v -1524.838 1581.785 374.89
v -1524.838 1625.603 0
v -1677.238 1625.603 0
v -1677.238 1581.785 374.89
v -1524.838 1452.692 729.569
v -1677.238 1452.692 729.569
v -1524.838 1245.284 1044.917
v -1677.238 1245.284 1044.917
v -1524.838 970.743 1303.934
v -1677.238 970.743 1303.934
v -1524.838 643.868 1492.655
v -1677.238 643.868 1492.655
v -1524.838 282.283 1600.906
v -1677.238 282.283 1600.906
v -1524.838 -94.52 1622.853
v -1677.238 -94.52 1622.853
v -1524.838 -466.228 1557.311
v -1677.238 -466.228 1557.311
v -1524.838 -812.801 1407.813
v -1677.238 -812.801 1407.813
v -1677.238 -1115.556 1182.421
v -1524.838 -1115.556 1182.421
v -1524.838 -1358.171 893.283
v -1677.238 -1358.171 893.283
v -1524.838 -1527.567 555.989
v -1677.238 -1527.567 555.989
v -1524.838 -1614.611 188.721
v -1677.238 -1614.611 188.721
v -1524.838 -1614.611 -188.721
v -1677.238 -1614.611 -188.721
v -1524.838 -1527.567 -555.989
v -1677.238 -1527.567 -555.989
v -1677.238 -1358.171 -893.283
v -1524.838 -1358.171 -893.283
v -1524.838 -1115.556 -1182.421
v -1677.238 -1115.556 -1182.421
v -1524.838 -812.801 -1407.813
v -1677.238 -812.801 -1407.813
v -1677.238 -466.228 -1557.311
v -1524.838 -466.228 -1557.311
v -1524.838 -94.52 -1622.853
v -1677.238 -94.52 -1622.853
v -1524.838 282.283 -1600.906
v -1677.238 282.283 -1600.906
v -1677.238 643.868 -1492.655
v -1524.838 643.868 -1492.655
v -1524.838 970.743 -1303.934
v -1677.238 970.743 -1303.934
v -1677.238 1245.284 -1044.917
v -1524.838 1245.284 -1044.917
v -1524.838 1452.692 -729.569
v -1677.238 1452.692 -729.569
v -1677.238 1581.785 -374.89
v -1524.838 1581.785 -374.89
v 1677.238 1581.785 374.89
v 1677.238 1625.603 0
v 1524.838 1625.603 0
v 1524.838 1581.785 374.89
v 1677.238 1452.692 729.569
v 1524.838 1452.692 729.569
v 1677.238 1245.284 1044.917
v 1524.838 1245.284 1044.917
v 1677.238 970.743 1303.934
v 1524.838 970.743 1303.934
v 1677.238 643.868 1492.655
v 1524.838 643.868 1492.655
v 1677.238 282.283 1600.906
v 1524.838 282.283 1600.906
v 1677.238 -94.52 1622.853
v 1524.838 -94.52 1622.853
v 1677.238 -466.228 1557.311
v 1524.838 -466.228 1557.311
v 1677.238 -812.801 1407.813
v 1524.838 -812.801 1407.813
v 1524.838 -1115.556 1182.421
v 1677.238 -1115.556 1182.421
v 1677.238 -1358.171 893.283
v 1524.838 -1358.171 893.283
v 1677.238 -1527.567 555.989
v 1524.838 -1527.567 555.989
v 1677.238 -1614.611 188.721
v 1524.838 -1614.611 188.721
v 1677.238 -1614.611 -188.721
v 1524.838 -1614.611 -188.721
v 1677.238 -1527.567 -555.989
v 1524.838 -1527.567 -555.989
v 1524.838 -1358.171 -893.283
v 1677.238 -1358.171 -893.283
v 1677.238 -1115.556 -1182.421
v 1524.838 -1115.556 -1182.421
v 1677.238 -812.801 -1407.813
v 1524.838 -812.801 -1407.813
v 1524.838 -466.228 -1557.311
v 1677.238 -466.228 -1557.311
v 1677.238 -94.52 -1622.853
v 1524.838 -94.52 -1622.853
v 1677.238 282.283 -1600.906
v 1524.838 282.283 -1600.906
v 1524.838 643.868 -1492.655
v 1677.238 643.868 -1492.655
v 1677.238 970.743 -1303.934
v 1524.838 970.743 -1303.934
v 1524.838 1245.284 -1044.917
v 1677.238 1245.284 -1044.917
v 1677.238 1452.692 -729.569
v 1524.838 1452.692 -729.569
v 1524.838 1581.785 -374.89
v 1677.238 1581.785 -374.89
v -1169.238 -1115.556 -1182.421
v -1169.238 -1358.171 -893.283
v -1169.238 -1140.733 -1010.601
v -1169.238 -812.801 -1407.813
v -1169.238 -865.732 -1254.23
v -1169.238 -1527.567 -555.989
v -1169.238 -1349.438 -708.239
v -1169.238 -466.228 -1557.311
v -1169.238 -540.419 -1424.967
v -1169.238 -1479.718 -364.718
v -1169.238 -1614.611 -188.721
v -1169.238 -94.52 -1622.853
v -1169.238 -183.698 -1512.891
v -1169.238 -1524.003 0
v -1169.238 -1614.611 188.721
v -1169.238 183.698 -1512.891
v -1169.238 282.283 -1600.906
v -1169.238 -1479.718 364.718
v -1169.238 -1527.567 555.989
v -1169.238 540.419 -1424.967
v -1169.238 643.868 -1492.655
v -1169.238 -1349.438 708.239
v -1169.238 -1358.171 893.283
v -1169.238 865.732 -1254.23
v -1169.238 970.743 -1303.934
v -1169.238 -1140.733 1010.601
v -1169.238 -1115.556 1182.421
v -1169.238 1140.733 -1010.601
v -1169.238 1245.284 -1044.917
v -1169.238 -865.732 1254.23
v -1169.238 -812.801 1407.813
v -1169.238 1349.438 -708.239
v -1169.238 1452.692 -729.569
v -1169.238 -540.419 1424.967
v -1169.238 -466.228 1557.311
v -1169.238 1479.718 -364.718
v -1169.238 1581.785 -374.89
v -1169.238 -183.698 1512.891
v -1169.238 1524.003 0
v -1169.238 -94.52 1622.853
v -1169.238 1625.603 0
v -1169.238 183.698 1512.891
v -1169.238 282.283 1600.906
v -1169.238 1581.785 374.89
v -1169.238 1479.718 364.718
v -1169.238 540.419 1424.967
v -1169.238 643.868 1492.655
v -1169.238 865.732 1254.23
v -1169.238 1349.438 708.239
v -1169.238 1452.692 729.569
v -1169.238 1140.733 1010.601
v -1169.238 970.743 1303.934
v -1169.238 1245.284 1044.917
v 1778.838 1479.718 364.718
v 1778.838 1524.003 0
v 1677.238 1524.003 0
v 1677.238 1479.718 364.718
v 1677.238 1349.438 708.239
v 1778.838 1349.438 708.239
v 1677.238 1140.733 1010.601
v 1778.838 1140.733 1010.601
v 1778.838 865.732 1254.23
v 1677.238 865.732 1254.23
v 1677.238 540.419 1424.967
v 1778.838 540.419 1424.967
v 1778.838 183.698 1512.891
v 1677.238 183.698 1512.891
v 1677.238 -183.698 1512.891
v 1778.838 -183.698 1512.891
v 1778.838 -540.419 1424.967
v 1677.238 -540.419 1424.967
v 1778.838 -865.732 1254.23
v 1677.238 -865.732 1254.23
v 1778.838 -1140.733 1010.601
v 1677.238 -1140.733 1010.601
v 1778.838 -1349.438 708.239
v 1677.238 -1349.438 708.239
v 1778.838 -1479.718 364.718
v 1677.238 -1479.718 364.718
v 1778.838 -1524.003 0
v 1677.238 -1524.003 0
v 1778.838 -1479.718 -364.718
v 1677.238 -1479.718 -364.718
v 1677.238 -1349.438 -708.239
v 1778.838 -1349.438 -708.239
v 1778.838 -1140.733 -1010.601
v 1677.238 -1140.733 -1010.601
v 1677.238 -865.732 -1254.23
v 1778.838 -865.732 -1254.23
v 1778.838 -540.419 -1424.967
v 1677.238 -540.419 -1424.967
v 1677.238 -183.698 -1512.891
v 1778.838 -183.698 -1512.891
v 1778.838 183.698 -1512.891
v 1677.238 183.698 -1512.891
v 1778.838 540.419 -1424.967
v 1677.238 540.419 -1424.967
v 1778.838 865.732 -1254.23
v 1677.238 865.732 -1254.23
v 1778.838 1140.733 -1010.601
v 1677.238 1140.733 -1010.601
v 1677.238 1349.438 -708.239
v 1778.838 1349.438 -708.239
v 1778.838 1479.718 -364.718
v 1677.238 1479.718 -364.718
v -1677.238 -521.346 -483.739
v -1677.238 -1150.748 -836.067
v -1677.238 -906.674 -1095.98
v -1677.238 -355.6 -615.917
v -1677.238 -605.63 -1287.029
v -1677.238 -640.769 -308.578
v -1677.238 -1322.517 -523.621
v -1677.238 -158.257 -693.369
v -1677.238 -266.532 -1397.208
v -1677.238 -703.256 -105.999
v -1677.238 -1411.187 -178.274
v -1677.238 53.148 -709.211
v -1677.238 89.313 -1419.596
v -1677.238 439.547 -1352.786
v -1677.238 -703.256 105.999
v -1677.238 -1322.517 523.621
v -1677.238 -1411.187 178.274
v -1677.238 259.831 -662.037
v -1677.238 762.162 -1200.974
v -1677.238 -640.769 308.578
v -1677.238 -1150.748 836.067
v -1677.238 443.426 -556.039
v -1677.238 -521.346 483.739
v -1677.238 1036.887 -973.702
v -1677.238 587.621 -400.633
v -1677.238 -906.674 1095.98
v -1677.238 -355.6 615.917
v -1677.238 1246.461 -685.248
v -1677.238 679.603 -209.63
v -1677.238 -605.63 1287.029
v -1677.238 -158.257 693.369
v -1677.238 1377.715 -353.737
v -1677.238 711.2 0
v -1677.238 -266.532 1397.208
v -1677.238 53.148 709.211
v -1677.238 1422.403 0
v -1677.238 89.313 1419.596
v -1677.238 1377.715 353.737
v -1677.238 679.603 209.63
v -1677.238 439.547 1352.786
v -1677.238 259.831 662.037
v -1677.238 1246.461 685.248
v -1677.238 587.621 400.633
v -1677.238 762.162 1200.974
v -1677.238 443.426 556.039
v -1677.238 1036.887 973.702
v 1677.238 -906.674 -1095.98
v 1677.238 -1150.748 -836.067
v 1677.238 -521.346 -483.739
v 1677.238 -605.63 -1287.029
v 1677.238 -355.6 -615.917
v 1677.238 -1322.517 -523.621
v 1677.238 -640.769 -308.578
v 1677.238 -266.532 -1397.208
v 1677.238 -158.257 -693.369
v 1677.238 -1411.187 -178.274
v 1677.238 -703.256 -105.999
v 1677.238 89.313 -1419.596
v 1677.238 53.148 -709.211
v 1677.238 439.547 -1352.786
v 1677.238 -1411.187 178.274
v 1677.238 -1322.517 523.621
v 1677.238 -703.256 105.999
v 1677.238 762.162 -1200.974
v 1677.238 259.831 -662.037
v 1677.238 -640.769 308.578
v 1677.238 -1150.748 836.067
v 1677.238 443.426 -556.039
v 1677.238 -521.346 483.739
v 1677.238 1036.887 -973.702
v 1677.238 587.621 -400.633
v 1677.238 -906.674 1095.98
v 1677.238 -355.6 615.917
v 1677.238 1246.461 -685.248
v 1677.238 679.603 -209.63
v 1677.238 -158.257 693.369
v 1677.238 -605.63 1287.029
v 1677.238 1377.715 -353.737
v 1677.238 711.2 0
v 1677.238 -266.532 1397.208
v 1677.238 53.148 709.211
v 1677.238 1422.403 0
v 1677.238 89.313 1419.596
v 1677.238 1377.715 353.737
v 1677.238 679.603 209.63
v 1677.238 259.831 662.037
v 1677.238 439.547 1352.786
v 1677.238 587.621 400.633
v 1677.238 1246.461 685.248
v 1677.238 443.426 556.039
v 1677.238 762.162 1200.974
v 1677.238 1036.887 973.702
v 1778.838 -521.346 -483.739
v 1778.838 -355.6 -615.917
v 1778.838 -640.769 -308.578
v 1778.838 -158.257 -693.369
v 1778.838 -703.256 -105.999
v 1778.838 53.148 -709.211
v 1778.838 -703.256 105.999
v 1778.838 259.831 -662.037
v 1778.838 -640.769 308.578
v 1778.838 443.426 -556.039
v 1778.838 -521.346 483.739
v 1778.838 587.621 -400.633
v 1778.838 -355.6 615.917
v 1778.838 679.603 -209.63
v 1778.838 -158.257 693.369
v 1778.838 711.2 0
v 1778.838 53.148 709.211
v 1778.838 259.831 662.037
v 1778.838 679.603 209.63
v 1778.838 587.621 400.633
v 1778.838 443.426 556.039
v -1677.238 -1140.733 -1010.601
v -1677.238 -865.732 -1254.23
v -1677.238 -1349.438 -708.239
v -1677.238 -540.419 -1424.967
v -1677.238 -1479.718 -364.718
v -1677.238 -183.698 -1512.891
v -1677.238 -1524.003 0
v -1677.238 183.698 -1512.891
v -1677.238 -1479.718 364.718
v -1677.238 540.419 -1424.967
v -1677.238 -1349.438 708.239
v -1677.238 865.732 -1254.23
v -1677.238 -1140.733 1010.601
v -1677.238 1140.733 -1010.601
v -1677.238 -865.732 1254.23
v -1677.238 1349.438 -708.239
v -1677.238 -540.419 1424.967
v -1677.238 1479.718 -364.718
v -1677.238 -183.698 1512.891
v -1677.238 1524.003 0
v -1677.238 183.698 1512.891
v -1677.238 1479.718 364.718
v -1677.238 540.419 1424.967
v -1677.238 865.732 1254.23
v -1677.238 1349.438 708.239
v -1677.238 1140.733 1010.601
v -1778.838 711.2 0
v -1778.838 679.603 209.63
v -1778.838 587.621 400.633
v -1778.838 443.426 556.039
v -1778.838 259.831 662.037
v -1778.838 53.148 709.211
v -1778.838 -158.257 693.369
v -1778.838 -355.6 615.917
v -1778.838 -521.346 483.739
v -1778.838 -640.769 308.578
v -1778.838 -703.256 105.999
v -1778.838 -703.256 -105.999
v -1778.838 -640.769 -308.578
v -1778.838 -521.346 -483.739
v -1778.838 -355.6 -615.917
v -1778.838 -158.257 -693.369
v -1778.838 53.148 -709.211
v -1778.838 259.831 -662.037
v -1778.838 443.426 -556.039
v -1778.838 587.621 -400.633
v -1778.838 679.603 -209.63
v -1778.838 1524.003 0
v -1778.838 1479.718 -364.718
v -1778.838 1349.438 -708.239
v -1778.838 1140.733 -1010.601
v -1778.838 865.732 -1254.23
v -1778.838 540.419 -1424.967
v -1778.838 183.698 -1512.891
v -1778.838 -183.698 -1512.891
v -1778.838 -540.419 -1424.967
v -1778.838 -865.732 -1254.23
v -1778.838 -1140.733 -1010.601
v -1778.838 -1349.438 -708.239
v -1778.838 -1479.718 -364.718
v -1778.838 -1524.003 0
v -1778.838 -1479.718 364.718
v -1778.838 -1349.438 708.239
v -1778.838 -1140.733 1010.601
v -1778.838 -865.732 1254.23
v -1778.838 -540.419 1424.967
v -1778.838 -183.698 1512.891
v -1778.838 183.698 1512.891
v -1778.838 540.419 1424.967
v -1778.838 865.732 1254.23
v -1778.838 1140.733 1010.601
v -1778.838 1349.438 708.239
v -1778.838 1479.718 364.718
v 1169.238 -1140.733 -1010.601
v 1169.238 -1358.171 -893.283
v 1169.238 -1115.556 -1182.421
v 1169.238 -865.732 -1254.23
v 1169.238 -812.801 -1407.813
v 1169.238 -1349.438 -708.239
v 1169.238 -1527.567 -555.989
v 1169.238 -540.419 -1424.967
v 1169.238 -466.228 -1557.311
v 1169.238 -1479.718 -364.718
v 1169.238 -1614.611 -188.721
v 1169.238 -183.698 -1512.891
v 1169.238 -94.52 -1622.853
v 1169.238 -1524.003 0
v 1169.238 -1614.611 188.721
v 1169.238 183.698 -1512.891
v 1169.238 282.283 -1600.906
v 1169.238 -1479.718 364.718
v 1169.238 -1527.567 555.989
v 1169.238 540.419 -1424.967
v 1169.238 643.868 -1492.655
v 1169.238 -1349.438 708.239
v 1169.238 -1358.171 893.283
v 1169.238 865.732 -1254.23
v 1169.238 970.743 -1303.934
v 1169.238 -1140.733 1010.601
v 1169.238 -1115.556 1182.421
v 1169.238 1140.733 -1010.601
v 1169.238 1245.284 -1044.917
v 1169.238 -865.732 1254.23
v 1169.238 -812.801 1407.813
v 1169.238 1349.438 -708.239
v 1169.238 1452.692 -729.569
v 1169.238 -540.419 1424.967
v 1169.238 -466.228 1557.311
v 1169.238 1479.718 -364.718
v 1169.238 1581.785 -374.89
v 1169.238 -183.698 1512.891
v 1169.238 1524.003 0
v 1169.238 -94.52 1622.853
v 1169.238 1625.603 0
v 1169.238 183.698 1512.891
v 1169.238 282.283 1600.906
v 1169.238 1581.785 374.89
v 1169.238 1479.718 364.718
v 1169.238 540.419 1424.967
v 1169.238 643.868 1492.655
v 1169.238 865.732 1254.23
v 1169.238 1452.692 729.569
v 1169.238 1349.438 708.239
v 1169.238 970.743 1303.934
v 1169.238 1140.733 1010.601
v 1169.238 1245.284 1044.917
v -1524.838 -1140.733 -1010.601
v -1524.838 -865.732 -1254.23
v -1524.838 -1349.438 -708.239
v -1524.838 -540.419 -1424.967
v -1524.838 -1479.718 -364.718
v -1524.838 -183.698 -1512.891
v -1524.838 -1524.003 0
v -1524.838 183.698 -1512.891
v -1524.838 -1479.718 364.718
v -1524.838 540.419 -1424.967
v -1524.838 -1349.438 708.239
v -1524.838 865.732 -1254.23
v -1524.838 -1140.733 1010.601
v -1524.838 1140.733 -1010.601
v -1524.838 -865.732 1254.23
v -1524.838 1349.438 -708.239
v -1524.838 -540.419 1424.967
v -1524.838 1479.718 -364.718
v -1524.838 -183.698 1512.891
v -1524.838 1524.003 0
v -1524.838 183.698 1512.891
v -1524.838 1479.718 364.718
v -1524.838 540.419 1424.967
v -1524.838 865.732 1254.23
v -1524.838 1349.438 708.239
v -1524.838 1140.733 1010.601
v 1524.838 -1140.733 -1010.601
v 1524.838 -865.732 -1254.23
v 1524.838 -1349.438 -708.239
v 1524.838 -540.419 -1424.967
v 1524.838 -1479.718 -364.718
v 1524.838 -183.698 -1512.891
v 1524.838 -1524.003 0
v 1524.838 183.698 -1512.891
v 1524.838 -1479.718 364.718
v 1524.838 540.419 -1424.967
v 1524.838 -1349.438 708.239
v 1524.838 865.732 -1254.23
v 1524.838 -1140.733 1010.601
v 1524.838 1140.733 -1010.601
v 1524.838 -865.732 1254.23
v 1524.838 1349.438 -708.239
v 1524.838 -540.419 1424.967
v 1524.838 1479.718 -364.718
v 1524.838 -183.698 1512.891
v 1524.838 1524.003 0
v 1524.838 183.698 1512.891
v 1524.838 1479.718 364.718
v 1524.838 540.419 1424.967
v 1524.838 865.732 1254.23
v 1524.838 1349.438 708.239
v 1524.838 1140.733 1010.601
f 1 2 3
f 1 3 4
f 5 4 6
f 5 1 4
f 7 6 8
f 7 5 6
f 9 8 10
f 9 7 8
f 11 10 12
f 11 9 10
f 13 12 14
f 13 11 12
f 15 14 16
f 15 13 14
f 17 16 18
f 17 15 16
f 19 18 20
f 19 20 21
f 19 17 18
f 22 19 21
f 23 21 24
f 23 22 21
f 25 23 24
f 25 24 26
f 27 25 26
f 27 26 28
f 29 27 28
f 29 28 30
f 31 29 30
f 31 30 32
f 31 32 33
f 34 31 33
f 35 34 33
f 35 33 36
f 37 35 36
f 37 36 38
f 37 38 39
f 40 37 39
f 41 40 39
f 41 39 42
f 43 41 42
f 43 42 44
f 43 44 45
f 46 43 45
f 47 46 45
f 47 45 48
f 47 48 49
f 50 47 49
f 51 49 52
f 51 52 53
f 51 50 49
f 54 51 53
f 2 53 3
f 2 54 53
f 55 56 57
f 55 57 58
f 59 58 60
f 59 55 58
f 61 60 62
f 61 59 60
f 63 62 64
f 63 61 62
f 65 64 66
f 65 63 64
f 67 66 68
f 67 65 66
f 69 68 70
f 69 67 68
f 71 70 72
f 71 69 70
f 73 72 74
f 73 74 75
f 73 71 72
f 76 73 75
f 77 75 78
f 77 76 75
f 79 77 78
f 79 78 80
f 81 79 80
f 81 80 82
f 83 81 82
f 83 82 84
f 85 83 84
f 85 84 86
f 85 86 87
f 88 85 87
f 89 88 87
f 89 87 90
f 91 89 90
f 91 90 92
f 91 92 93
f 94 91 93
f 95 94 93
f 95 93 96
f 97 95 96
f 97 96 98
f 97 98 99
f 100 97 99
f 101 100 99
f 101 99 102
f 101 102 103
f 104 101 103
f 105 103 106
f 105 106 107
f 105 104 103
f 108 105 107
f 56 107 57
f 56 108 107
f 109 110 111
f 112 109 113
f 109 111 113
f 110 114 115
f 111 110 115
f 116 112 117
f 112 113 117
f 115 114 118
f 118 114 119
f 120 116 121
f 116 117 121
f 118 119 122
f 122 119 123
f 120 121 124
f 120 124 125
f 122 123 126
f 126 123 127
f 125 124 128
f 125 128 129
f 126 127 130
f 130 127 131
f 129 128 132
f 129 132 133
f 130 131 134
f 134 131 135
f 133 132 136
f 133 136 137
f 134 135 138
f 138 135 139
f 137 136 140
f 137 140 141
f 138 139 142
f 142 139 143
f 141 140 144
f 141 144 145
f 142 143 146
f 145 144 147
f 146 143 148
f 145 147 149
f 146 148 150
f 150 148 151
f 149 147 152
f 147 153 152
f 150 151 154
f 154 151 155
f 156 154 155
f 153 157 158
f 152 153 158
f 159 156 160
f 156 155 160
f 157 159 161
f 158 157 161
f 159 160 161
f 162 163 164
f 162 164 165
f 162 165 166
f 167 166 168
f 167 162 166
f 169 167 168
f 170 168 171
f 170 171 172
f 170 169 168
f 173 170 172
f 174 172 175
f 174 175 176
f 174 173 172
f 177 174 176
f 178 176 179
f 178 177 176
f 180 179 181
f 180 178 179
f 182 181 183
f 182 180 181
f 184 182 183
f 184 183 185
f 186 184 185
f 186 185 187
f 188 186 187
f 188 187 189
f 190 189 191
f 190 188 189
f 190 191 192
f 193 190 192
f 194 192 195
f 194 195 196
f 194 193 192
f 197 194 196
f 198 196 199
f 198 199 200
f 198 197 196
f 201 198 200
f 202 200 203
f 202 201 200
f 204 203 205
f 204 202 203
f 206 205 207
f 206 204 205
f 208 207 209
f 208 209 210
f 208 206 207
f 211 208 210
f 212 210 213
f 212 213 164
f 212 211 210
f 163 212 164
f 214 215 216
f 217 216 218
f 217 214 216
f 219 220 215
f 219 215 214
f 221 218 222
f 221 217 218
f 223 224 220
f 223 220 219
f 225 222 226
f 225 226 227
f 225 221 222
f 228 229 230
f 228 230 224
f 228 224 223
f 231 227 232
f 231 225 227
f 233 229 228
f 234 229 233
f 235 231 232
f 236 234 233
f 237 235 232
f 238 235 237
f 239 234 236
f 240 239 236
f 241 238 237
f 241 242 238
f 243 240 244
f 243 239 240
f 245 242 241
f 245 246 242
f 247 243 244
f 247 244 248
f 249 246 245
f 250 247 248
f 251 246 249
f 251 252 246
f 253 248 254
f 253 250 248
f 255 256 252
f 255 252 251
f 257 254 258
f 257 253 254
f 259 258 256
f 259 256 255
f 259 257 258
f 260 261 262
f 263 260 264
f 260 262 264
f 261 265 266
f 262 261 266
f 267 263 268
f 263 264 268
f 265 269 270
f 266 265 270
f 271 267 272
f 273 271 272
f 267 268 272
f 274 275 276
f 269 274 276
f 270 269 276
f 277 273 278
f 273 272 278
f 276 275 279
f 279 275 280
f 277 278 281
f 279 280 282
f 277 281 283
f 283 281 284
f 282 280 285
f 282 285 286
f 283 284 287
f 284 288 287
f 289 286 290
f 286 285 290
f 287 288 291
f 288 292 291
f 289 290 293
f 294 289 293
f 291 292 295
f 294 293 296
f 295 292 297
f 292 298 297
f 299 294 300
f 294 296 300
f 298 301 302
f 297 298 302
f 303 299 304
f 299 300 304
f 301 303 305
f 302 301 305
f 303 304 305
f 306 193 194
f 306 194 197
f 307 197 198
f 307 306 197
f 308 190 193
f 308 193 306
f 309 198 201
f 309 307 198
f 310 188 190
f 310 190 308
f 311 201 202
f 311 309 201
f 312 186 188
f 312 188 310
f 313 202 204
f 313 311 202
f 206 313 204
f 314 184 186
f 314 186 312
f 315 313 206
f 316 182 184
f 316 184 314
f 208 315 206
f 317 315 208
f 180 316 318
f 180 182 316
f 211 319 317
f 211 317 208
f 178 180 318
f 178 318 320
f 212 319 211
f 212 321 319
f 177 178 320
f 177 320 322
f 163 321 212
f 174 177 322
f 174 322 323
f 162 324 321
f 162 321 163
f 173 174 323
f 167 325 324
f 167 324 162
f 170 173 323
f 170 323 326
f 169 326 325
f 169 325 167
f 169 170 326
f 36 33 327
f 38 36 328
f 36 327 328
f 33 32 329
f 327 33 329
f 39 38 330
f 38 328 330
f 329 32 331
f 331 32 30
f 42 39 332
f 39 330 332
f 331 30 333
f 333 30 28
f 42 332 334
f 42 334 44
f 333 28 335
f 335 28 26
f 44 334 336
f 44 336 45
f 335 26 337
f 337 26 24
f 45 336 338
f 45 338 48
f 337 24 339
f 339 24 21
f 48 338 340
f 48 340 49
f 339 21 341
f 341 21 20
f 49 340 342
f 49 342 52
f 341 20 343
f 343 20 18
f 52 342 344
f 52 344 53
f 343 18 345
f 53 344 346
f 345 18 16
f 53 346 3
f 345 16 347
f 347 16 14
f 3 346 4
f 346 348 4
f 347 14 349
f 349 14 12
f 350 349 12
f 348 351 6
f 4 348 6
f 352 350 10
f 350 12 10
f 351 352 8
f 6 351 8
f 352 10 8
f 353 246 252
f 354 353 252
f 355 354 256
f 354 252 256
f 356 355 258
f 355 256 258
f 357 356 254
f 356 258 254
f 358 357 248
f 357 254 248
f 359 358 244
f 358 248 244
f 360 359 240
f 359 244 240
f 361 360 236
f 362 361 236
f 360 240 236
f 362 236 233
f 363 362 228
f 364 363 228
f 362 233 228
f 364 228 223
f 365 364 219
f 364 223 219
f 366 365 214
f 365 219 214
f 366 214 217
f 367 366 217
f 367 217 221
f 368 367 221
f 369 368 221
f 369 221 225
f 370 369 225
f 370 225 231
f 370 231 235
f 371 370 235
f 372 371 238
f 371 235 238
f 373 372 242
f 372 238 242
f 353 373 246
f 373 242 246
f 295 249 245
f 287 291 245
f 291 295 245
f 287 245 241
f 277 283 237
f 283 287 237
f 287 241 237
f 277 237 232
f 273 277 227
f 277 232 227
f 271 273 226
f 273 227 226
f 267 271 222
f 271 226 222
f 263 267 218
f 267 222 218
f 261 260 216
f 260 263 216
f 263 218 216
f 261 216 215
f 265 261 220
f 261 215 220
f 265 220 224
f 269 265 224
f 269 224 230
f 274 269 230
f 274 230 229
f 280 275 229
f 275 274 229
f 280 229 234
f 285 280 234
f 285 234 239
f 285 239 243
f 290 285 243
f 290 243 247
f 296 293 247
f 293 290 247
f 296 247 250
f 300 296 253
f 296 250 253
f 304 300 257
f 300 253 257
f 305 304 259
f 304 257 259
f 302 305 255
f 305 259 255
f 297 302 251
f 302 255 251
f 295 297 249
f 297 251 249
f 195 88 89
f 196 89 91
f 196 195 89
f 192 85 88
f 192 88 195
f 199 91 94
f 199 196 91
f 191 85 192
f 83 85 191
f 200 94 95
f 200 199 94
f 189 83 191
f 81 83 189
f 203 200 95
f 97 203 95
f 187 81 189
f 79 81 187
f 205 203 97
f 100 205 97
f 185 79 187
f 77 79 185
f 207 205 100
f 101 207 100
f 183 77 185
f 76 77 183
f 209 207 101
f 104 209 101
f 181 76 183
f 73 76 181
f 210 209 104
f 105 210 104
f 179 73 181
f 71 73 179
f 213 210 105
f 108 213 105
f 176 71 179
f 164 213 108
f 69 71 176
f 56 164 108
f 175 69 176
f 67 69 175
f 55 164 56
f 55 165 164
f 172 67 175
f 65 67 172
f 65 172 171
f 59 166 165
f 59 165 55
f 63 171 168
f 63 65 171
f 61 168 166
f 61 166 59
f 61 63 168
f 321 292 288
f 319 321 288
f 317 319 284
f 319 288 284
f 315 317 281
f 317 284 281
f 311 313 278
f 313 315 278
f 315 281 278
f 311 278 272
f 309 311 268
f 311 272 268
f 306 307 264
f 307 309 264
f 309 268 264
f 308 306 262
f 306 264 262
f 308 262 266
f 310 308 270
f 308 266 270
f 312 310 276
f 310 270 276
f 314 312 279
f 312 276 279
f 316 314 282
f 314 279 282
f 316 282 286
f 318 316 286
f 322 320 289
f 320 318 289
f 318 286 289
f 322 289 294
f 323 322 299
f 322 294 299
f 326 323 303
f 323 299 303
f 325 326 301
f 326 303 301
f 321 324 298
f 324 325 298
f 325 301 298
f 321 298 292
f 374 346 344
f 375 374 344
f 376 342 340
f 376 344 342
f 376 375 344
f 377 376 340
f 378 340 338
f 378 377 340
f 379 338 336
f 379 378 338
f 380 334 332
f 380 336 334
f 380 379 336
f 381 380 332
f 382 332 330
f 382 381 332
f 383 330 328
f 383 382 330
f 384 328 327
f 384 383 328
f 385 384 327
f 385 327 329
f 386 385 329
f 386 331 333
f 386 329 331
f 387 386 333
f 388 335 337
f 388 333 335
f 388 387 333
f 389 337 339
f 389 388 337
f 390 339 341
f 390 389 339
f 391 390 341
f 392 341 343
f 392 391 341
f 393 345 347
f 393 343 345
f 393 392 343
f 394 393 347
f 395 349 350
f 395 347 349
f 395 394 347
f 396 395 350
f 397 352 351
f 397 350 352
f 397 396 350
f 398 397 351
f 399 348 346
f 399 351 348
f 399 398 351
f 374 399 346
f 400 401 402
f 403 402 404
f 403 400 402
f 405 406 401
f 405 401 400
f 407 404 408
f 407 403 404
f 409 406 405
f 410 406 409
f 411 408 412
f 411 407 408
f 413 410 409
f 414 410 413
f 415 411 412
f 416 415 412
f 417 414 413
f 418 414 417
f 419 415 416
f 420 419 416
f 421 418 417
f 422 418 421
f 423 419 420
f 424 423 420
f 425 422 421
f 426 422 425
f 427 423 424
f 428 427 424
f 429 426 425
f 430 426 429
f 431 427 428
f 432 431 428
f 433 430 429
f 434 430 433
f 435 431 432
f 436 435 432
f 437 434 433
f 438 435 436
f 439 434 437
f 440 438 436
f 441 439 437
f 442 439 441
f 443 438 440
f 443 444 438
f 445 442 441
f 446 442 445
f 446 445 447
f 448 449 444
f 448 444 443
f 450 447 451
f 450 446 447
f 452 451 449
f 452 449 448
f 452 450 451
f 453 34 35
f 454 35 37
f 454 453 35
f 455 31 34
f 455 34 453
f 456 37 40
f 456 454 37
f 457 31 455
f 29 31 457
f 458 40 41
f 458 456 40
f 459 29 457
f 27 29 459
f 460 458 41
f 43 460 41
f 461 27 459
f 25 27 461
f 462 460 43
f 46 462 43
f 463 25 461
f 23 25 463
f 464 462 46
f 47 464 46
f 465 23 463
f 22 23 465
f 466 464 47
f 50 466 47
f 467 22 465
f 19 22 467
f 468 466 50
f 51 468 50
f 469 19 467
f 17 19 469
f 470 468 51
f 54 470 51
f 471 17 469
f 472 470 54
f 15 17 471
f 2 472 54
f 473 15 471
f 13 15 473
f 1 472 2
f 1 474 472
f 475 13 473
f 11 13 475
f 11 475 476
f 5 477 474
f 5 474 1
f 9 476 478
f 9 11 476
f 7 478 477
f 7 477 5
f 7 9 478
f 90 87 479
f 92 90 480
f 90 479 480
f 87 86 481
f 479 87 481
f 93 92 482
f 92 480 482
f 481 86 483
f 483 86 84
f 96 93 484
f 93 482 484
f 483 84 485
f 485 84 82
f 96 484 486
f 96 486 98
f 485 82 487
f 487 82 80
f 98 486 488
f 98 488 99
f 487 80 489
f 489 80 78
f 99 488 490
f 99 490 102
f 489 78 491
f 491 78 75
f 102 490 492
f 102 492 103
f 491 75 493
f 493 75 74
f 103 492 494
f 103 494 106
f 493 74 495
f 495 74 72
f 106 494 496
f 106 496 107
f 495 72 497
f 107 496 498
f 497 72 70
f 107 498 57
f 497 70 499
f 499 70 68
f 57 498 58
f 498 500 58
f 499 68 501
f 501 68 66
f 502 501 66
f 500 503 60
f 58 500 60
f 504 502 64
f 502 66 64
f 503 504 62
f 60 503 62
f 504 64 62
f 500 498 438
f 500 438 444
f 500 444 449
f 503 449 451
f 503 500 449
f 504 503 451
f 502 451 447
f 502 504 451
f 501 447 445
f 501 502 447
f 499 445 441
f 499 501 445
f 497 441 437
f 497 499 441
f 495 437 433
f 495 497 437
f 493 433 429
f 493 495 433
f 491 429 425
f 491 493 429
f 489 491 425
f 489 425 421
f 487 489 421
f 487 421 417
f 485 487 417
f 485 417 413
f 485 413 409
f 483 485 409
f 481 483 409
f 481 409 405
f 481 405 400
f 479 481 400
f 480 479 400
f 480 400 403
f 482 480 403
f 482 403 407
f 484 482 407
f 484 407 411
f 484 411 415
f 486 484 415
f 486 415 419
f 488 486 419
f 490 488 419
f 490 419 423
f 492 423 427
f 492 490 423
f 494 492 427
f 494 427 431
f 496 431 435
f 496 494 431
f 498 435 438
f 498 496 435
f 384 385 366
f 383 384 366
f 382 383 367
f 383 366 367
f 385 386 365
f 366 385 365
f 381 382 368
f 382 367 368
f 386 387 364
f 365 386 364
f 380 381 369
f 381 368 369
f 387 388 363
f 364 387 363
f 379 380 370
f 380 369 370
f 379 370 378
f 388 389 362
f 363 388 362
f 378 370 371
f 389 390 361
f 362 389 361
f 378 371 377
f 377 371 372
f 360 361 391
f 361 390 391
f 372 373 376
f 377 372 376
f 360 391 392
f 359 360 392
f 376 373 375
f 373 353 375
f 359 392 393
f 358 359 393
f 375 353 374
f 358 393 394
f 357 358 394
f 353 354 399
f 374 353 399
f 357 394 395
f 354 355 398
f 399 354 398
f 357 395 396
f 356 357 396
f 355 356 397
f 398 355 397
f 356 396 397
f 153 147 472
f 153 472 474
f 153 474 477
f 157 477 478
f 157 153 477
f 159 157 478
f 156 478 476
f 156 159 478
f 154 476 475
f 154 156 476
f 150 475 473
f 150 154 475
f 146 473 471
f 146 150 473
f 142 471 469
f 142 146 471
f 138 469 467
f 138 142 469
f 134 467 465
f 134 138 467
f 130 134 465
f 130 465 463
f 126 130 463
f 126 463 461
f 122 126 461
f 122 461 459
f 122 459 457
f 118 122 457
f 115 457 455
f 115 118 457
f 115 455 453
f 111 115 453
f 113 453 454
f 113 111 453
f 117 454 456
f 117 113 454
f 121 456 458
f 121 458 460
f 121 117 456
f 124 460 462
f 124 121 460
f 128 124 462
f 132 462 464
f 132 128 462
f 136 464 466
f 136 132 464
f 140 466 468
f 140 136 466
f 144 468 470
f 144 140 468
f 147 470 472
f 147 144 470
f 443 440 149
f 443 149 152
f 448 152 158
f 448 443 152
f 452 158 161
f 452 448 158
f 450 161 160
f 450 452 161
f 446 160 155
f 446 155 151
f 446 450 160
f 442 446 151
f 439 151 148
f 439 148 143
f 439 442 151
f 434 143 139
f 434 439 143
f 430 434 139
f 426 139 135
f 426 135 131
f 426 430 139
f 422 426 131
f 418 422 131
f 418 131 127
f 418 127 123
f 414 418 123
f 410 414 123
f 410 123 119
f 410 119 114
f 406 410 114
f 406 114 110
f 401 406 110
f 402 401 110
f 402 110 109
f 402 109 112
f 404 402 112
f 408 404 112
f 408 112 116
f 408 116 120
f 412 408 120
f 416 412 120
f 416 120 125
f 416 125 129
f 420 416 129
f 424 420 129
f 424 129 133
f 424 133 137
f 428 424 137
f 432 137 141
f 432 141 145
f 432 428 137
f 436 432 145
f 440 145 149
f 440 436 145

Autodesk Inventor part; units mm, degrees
ref_plane "YZ Plane" through (0, 0, 0) normal (1, 0, 0) x (0, 1, 0)
ref_plane "XZ Plane" through (0, 0, 0) normal (0, 1, 0) x (-1, 0, 0)
ref_plane "XY Plane" through (0, 0, 0) normal (0, 0, 1) x (1, 0, 0)
sketch "Sketch1" plane through (0, 0, 0) normal (0, 0, 1) x (1, 0, 0)
  line L0 (1524.8384, 1524.0029) -> (1524.8384, 1625.6029)
  line L1 (1524.8384, 1625.6029) -> (1677.2384, 1625.6029)
  line L2 (1677.2384, 1625.6029) -> (1677.2384, 1524.0029)
  line L3 (1677.2384, 1422.4029) -> (-1677.2384, 1422.4029)
  line L4 (-1677.2384, 1524.0029) -> (-1677.2384, 1625.6029)
  line L5 (-1677.2384, 1625.6029) -> (-1524.8384, 1625.6029)
  line L6 (-1524.8384, 1625.6029) -> (-1524.8384, 1524.0029)
  line L7 (0, 0) -> (0, 1422.4029) construction
  line L8 (-1778.8384, 0) -> (1778.8384, 0) construction
  line L9 (-1677.2384, 1524.0029) -> (-1778.8384, 1524.0029)
  line L10 (-1778.8384, 1524.0029) -> (-1778.8384, 711.2)
  line L11 (-1778.8384, 711.2) -> (-1677.2384, 711.2)
  line L12 (-1677.2384, 1422.4029) -> (-1677.2384, 711.2)
  line L13 (1677.2384, 1524.0029) -> (1778.8384, 1524.0029)
  line L14 (1778.8384, 1524.0029) -> (1778.8384, 711.2)
  line L15 (1778.8384, 711.2) -> (1677.2384, 711.2)
  line L16 (1677.2384, 711.2) -> (1677.2384, 1422.4029)
  line L17 (-1169.2384, 1524.0029) -> (-1169.2384, 1625.6029)
  line L18 (-1169.2384, 1625.6029) -> (1169.2384, 1625.6029)
  line L19 (1169.2384, 1625.6029) -> (1169.2384, 1524.0029)
  line L20 (-1524.8384, 1524.0029) -> (-1169.2384, 1524.0029)
  line L21 (1169.2384, 1524.0029) -> (1524.8384, 1524.0029)
  line L22 (0, 711.2) -> (0, -711.2) construction
  line L23 (-1524.8384, -2097.6769) -> (-1524.8384, 2097.6769) construction
  line L24 (1167.5616, -2093.8572) -> (1167.5616, 2101.4966) construction
  line L25 (-1169.2384, 2097.6769) -> (-1169.2384, -2097.6769) construction
  line L26 (1523.1616, 2101.4966) -> (1523.1616, -2093.8572) construction
  line L27 (-1474.0384, -1524.0029) -> (-1474.0384, 1524.0029) construction
  line L28 (-1220.0384, 1524.0029) -> (-1220.0384, -1524.0029) construction
revolve "Revolution1" add sketch "Sketch1" angle 360 about axis through (-1778.8384, 0, 0) along (1, 0, 0)
properties part number "OutsideMiddleShaftCJE" material "Steel, Alloy"
